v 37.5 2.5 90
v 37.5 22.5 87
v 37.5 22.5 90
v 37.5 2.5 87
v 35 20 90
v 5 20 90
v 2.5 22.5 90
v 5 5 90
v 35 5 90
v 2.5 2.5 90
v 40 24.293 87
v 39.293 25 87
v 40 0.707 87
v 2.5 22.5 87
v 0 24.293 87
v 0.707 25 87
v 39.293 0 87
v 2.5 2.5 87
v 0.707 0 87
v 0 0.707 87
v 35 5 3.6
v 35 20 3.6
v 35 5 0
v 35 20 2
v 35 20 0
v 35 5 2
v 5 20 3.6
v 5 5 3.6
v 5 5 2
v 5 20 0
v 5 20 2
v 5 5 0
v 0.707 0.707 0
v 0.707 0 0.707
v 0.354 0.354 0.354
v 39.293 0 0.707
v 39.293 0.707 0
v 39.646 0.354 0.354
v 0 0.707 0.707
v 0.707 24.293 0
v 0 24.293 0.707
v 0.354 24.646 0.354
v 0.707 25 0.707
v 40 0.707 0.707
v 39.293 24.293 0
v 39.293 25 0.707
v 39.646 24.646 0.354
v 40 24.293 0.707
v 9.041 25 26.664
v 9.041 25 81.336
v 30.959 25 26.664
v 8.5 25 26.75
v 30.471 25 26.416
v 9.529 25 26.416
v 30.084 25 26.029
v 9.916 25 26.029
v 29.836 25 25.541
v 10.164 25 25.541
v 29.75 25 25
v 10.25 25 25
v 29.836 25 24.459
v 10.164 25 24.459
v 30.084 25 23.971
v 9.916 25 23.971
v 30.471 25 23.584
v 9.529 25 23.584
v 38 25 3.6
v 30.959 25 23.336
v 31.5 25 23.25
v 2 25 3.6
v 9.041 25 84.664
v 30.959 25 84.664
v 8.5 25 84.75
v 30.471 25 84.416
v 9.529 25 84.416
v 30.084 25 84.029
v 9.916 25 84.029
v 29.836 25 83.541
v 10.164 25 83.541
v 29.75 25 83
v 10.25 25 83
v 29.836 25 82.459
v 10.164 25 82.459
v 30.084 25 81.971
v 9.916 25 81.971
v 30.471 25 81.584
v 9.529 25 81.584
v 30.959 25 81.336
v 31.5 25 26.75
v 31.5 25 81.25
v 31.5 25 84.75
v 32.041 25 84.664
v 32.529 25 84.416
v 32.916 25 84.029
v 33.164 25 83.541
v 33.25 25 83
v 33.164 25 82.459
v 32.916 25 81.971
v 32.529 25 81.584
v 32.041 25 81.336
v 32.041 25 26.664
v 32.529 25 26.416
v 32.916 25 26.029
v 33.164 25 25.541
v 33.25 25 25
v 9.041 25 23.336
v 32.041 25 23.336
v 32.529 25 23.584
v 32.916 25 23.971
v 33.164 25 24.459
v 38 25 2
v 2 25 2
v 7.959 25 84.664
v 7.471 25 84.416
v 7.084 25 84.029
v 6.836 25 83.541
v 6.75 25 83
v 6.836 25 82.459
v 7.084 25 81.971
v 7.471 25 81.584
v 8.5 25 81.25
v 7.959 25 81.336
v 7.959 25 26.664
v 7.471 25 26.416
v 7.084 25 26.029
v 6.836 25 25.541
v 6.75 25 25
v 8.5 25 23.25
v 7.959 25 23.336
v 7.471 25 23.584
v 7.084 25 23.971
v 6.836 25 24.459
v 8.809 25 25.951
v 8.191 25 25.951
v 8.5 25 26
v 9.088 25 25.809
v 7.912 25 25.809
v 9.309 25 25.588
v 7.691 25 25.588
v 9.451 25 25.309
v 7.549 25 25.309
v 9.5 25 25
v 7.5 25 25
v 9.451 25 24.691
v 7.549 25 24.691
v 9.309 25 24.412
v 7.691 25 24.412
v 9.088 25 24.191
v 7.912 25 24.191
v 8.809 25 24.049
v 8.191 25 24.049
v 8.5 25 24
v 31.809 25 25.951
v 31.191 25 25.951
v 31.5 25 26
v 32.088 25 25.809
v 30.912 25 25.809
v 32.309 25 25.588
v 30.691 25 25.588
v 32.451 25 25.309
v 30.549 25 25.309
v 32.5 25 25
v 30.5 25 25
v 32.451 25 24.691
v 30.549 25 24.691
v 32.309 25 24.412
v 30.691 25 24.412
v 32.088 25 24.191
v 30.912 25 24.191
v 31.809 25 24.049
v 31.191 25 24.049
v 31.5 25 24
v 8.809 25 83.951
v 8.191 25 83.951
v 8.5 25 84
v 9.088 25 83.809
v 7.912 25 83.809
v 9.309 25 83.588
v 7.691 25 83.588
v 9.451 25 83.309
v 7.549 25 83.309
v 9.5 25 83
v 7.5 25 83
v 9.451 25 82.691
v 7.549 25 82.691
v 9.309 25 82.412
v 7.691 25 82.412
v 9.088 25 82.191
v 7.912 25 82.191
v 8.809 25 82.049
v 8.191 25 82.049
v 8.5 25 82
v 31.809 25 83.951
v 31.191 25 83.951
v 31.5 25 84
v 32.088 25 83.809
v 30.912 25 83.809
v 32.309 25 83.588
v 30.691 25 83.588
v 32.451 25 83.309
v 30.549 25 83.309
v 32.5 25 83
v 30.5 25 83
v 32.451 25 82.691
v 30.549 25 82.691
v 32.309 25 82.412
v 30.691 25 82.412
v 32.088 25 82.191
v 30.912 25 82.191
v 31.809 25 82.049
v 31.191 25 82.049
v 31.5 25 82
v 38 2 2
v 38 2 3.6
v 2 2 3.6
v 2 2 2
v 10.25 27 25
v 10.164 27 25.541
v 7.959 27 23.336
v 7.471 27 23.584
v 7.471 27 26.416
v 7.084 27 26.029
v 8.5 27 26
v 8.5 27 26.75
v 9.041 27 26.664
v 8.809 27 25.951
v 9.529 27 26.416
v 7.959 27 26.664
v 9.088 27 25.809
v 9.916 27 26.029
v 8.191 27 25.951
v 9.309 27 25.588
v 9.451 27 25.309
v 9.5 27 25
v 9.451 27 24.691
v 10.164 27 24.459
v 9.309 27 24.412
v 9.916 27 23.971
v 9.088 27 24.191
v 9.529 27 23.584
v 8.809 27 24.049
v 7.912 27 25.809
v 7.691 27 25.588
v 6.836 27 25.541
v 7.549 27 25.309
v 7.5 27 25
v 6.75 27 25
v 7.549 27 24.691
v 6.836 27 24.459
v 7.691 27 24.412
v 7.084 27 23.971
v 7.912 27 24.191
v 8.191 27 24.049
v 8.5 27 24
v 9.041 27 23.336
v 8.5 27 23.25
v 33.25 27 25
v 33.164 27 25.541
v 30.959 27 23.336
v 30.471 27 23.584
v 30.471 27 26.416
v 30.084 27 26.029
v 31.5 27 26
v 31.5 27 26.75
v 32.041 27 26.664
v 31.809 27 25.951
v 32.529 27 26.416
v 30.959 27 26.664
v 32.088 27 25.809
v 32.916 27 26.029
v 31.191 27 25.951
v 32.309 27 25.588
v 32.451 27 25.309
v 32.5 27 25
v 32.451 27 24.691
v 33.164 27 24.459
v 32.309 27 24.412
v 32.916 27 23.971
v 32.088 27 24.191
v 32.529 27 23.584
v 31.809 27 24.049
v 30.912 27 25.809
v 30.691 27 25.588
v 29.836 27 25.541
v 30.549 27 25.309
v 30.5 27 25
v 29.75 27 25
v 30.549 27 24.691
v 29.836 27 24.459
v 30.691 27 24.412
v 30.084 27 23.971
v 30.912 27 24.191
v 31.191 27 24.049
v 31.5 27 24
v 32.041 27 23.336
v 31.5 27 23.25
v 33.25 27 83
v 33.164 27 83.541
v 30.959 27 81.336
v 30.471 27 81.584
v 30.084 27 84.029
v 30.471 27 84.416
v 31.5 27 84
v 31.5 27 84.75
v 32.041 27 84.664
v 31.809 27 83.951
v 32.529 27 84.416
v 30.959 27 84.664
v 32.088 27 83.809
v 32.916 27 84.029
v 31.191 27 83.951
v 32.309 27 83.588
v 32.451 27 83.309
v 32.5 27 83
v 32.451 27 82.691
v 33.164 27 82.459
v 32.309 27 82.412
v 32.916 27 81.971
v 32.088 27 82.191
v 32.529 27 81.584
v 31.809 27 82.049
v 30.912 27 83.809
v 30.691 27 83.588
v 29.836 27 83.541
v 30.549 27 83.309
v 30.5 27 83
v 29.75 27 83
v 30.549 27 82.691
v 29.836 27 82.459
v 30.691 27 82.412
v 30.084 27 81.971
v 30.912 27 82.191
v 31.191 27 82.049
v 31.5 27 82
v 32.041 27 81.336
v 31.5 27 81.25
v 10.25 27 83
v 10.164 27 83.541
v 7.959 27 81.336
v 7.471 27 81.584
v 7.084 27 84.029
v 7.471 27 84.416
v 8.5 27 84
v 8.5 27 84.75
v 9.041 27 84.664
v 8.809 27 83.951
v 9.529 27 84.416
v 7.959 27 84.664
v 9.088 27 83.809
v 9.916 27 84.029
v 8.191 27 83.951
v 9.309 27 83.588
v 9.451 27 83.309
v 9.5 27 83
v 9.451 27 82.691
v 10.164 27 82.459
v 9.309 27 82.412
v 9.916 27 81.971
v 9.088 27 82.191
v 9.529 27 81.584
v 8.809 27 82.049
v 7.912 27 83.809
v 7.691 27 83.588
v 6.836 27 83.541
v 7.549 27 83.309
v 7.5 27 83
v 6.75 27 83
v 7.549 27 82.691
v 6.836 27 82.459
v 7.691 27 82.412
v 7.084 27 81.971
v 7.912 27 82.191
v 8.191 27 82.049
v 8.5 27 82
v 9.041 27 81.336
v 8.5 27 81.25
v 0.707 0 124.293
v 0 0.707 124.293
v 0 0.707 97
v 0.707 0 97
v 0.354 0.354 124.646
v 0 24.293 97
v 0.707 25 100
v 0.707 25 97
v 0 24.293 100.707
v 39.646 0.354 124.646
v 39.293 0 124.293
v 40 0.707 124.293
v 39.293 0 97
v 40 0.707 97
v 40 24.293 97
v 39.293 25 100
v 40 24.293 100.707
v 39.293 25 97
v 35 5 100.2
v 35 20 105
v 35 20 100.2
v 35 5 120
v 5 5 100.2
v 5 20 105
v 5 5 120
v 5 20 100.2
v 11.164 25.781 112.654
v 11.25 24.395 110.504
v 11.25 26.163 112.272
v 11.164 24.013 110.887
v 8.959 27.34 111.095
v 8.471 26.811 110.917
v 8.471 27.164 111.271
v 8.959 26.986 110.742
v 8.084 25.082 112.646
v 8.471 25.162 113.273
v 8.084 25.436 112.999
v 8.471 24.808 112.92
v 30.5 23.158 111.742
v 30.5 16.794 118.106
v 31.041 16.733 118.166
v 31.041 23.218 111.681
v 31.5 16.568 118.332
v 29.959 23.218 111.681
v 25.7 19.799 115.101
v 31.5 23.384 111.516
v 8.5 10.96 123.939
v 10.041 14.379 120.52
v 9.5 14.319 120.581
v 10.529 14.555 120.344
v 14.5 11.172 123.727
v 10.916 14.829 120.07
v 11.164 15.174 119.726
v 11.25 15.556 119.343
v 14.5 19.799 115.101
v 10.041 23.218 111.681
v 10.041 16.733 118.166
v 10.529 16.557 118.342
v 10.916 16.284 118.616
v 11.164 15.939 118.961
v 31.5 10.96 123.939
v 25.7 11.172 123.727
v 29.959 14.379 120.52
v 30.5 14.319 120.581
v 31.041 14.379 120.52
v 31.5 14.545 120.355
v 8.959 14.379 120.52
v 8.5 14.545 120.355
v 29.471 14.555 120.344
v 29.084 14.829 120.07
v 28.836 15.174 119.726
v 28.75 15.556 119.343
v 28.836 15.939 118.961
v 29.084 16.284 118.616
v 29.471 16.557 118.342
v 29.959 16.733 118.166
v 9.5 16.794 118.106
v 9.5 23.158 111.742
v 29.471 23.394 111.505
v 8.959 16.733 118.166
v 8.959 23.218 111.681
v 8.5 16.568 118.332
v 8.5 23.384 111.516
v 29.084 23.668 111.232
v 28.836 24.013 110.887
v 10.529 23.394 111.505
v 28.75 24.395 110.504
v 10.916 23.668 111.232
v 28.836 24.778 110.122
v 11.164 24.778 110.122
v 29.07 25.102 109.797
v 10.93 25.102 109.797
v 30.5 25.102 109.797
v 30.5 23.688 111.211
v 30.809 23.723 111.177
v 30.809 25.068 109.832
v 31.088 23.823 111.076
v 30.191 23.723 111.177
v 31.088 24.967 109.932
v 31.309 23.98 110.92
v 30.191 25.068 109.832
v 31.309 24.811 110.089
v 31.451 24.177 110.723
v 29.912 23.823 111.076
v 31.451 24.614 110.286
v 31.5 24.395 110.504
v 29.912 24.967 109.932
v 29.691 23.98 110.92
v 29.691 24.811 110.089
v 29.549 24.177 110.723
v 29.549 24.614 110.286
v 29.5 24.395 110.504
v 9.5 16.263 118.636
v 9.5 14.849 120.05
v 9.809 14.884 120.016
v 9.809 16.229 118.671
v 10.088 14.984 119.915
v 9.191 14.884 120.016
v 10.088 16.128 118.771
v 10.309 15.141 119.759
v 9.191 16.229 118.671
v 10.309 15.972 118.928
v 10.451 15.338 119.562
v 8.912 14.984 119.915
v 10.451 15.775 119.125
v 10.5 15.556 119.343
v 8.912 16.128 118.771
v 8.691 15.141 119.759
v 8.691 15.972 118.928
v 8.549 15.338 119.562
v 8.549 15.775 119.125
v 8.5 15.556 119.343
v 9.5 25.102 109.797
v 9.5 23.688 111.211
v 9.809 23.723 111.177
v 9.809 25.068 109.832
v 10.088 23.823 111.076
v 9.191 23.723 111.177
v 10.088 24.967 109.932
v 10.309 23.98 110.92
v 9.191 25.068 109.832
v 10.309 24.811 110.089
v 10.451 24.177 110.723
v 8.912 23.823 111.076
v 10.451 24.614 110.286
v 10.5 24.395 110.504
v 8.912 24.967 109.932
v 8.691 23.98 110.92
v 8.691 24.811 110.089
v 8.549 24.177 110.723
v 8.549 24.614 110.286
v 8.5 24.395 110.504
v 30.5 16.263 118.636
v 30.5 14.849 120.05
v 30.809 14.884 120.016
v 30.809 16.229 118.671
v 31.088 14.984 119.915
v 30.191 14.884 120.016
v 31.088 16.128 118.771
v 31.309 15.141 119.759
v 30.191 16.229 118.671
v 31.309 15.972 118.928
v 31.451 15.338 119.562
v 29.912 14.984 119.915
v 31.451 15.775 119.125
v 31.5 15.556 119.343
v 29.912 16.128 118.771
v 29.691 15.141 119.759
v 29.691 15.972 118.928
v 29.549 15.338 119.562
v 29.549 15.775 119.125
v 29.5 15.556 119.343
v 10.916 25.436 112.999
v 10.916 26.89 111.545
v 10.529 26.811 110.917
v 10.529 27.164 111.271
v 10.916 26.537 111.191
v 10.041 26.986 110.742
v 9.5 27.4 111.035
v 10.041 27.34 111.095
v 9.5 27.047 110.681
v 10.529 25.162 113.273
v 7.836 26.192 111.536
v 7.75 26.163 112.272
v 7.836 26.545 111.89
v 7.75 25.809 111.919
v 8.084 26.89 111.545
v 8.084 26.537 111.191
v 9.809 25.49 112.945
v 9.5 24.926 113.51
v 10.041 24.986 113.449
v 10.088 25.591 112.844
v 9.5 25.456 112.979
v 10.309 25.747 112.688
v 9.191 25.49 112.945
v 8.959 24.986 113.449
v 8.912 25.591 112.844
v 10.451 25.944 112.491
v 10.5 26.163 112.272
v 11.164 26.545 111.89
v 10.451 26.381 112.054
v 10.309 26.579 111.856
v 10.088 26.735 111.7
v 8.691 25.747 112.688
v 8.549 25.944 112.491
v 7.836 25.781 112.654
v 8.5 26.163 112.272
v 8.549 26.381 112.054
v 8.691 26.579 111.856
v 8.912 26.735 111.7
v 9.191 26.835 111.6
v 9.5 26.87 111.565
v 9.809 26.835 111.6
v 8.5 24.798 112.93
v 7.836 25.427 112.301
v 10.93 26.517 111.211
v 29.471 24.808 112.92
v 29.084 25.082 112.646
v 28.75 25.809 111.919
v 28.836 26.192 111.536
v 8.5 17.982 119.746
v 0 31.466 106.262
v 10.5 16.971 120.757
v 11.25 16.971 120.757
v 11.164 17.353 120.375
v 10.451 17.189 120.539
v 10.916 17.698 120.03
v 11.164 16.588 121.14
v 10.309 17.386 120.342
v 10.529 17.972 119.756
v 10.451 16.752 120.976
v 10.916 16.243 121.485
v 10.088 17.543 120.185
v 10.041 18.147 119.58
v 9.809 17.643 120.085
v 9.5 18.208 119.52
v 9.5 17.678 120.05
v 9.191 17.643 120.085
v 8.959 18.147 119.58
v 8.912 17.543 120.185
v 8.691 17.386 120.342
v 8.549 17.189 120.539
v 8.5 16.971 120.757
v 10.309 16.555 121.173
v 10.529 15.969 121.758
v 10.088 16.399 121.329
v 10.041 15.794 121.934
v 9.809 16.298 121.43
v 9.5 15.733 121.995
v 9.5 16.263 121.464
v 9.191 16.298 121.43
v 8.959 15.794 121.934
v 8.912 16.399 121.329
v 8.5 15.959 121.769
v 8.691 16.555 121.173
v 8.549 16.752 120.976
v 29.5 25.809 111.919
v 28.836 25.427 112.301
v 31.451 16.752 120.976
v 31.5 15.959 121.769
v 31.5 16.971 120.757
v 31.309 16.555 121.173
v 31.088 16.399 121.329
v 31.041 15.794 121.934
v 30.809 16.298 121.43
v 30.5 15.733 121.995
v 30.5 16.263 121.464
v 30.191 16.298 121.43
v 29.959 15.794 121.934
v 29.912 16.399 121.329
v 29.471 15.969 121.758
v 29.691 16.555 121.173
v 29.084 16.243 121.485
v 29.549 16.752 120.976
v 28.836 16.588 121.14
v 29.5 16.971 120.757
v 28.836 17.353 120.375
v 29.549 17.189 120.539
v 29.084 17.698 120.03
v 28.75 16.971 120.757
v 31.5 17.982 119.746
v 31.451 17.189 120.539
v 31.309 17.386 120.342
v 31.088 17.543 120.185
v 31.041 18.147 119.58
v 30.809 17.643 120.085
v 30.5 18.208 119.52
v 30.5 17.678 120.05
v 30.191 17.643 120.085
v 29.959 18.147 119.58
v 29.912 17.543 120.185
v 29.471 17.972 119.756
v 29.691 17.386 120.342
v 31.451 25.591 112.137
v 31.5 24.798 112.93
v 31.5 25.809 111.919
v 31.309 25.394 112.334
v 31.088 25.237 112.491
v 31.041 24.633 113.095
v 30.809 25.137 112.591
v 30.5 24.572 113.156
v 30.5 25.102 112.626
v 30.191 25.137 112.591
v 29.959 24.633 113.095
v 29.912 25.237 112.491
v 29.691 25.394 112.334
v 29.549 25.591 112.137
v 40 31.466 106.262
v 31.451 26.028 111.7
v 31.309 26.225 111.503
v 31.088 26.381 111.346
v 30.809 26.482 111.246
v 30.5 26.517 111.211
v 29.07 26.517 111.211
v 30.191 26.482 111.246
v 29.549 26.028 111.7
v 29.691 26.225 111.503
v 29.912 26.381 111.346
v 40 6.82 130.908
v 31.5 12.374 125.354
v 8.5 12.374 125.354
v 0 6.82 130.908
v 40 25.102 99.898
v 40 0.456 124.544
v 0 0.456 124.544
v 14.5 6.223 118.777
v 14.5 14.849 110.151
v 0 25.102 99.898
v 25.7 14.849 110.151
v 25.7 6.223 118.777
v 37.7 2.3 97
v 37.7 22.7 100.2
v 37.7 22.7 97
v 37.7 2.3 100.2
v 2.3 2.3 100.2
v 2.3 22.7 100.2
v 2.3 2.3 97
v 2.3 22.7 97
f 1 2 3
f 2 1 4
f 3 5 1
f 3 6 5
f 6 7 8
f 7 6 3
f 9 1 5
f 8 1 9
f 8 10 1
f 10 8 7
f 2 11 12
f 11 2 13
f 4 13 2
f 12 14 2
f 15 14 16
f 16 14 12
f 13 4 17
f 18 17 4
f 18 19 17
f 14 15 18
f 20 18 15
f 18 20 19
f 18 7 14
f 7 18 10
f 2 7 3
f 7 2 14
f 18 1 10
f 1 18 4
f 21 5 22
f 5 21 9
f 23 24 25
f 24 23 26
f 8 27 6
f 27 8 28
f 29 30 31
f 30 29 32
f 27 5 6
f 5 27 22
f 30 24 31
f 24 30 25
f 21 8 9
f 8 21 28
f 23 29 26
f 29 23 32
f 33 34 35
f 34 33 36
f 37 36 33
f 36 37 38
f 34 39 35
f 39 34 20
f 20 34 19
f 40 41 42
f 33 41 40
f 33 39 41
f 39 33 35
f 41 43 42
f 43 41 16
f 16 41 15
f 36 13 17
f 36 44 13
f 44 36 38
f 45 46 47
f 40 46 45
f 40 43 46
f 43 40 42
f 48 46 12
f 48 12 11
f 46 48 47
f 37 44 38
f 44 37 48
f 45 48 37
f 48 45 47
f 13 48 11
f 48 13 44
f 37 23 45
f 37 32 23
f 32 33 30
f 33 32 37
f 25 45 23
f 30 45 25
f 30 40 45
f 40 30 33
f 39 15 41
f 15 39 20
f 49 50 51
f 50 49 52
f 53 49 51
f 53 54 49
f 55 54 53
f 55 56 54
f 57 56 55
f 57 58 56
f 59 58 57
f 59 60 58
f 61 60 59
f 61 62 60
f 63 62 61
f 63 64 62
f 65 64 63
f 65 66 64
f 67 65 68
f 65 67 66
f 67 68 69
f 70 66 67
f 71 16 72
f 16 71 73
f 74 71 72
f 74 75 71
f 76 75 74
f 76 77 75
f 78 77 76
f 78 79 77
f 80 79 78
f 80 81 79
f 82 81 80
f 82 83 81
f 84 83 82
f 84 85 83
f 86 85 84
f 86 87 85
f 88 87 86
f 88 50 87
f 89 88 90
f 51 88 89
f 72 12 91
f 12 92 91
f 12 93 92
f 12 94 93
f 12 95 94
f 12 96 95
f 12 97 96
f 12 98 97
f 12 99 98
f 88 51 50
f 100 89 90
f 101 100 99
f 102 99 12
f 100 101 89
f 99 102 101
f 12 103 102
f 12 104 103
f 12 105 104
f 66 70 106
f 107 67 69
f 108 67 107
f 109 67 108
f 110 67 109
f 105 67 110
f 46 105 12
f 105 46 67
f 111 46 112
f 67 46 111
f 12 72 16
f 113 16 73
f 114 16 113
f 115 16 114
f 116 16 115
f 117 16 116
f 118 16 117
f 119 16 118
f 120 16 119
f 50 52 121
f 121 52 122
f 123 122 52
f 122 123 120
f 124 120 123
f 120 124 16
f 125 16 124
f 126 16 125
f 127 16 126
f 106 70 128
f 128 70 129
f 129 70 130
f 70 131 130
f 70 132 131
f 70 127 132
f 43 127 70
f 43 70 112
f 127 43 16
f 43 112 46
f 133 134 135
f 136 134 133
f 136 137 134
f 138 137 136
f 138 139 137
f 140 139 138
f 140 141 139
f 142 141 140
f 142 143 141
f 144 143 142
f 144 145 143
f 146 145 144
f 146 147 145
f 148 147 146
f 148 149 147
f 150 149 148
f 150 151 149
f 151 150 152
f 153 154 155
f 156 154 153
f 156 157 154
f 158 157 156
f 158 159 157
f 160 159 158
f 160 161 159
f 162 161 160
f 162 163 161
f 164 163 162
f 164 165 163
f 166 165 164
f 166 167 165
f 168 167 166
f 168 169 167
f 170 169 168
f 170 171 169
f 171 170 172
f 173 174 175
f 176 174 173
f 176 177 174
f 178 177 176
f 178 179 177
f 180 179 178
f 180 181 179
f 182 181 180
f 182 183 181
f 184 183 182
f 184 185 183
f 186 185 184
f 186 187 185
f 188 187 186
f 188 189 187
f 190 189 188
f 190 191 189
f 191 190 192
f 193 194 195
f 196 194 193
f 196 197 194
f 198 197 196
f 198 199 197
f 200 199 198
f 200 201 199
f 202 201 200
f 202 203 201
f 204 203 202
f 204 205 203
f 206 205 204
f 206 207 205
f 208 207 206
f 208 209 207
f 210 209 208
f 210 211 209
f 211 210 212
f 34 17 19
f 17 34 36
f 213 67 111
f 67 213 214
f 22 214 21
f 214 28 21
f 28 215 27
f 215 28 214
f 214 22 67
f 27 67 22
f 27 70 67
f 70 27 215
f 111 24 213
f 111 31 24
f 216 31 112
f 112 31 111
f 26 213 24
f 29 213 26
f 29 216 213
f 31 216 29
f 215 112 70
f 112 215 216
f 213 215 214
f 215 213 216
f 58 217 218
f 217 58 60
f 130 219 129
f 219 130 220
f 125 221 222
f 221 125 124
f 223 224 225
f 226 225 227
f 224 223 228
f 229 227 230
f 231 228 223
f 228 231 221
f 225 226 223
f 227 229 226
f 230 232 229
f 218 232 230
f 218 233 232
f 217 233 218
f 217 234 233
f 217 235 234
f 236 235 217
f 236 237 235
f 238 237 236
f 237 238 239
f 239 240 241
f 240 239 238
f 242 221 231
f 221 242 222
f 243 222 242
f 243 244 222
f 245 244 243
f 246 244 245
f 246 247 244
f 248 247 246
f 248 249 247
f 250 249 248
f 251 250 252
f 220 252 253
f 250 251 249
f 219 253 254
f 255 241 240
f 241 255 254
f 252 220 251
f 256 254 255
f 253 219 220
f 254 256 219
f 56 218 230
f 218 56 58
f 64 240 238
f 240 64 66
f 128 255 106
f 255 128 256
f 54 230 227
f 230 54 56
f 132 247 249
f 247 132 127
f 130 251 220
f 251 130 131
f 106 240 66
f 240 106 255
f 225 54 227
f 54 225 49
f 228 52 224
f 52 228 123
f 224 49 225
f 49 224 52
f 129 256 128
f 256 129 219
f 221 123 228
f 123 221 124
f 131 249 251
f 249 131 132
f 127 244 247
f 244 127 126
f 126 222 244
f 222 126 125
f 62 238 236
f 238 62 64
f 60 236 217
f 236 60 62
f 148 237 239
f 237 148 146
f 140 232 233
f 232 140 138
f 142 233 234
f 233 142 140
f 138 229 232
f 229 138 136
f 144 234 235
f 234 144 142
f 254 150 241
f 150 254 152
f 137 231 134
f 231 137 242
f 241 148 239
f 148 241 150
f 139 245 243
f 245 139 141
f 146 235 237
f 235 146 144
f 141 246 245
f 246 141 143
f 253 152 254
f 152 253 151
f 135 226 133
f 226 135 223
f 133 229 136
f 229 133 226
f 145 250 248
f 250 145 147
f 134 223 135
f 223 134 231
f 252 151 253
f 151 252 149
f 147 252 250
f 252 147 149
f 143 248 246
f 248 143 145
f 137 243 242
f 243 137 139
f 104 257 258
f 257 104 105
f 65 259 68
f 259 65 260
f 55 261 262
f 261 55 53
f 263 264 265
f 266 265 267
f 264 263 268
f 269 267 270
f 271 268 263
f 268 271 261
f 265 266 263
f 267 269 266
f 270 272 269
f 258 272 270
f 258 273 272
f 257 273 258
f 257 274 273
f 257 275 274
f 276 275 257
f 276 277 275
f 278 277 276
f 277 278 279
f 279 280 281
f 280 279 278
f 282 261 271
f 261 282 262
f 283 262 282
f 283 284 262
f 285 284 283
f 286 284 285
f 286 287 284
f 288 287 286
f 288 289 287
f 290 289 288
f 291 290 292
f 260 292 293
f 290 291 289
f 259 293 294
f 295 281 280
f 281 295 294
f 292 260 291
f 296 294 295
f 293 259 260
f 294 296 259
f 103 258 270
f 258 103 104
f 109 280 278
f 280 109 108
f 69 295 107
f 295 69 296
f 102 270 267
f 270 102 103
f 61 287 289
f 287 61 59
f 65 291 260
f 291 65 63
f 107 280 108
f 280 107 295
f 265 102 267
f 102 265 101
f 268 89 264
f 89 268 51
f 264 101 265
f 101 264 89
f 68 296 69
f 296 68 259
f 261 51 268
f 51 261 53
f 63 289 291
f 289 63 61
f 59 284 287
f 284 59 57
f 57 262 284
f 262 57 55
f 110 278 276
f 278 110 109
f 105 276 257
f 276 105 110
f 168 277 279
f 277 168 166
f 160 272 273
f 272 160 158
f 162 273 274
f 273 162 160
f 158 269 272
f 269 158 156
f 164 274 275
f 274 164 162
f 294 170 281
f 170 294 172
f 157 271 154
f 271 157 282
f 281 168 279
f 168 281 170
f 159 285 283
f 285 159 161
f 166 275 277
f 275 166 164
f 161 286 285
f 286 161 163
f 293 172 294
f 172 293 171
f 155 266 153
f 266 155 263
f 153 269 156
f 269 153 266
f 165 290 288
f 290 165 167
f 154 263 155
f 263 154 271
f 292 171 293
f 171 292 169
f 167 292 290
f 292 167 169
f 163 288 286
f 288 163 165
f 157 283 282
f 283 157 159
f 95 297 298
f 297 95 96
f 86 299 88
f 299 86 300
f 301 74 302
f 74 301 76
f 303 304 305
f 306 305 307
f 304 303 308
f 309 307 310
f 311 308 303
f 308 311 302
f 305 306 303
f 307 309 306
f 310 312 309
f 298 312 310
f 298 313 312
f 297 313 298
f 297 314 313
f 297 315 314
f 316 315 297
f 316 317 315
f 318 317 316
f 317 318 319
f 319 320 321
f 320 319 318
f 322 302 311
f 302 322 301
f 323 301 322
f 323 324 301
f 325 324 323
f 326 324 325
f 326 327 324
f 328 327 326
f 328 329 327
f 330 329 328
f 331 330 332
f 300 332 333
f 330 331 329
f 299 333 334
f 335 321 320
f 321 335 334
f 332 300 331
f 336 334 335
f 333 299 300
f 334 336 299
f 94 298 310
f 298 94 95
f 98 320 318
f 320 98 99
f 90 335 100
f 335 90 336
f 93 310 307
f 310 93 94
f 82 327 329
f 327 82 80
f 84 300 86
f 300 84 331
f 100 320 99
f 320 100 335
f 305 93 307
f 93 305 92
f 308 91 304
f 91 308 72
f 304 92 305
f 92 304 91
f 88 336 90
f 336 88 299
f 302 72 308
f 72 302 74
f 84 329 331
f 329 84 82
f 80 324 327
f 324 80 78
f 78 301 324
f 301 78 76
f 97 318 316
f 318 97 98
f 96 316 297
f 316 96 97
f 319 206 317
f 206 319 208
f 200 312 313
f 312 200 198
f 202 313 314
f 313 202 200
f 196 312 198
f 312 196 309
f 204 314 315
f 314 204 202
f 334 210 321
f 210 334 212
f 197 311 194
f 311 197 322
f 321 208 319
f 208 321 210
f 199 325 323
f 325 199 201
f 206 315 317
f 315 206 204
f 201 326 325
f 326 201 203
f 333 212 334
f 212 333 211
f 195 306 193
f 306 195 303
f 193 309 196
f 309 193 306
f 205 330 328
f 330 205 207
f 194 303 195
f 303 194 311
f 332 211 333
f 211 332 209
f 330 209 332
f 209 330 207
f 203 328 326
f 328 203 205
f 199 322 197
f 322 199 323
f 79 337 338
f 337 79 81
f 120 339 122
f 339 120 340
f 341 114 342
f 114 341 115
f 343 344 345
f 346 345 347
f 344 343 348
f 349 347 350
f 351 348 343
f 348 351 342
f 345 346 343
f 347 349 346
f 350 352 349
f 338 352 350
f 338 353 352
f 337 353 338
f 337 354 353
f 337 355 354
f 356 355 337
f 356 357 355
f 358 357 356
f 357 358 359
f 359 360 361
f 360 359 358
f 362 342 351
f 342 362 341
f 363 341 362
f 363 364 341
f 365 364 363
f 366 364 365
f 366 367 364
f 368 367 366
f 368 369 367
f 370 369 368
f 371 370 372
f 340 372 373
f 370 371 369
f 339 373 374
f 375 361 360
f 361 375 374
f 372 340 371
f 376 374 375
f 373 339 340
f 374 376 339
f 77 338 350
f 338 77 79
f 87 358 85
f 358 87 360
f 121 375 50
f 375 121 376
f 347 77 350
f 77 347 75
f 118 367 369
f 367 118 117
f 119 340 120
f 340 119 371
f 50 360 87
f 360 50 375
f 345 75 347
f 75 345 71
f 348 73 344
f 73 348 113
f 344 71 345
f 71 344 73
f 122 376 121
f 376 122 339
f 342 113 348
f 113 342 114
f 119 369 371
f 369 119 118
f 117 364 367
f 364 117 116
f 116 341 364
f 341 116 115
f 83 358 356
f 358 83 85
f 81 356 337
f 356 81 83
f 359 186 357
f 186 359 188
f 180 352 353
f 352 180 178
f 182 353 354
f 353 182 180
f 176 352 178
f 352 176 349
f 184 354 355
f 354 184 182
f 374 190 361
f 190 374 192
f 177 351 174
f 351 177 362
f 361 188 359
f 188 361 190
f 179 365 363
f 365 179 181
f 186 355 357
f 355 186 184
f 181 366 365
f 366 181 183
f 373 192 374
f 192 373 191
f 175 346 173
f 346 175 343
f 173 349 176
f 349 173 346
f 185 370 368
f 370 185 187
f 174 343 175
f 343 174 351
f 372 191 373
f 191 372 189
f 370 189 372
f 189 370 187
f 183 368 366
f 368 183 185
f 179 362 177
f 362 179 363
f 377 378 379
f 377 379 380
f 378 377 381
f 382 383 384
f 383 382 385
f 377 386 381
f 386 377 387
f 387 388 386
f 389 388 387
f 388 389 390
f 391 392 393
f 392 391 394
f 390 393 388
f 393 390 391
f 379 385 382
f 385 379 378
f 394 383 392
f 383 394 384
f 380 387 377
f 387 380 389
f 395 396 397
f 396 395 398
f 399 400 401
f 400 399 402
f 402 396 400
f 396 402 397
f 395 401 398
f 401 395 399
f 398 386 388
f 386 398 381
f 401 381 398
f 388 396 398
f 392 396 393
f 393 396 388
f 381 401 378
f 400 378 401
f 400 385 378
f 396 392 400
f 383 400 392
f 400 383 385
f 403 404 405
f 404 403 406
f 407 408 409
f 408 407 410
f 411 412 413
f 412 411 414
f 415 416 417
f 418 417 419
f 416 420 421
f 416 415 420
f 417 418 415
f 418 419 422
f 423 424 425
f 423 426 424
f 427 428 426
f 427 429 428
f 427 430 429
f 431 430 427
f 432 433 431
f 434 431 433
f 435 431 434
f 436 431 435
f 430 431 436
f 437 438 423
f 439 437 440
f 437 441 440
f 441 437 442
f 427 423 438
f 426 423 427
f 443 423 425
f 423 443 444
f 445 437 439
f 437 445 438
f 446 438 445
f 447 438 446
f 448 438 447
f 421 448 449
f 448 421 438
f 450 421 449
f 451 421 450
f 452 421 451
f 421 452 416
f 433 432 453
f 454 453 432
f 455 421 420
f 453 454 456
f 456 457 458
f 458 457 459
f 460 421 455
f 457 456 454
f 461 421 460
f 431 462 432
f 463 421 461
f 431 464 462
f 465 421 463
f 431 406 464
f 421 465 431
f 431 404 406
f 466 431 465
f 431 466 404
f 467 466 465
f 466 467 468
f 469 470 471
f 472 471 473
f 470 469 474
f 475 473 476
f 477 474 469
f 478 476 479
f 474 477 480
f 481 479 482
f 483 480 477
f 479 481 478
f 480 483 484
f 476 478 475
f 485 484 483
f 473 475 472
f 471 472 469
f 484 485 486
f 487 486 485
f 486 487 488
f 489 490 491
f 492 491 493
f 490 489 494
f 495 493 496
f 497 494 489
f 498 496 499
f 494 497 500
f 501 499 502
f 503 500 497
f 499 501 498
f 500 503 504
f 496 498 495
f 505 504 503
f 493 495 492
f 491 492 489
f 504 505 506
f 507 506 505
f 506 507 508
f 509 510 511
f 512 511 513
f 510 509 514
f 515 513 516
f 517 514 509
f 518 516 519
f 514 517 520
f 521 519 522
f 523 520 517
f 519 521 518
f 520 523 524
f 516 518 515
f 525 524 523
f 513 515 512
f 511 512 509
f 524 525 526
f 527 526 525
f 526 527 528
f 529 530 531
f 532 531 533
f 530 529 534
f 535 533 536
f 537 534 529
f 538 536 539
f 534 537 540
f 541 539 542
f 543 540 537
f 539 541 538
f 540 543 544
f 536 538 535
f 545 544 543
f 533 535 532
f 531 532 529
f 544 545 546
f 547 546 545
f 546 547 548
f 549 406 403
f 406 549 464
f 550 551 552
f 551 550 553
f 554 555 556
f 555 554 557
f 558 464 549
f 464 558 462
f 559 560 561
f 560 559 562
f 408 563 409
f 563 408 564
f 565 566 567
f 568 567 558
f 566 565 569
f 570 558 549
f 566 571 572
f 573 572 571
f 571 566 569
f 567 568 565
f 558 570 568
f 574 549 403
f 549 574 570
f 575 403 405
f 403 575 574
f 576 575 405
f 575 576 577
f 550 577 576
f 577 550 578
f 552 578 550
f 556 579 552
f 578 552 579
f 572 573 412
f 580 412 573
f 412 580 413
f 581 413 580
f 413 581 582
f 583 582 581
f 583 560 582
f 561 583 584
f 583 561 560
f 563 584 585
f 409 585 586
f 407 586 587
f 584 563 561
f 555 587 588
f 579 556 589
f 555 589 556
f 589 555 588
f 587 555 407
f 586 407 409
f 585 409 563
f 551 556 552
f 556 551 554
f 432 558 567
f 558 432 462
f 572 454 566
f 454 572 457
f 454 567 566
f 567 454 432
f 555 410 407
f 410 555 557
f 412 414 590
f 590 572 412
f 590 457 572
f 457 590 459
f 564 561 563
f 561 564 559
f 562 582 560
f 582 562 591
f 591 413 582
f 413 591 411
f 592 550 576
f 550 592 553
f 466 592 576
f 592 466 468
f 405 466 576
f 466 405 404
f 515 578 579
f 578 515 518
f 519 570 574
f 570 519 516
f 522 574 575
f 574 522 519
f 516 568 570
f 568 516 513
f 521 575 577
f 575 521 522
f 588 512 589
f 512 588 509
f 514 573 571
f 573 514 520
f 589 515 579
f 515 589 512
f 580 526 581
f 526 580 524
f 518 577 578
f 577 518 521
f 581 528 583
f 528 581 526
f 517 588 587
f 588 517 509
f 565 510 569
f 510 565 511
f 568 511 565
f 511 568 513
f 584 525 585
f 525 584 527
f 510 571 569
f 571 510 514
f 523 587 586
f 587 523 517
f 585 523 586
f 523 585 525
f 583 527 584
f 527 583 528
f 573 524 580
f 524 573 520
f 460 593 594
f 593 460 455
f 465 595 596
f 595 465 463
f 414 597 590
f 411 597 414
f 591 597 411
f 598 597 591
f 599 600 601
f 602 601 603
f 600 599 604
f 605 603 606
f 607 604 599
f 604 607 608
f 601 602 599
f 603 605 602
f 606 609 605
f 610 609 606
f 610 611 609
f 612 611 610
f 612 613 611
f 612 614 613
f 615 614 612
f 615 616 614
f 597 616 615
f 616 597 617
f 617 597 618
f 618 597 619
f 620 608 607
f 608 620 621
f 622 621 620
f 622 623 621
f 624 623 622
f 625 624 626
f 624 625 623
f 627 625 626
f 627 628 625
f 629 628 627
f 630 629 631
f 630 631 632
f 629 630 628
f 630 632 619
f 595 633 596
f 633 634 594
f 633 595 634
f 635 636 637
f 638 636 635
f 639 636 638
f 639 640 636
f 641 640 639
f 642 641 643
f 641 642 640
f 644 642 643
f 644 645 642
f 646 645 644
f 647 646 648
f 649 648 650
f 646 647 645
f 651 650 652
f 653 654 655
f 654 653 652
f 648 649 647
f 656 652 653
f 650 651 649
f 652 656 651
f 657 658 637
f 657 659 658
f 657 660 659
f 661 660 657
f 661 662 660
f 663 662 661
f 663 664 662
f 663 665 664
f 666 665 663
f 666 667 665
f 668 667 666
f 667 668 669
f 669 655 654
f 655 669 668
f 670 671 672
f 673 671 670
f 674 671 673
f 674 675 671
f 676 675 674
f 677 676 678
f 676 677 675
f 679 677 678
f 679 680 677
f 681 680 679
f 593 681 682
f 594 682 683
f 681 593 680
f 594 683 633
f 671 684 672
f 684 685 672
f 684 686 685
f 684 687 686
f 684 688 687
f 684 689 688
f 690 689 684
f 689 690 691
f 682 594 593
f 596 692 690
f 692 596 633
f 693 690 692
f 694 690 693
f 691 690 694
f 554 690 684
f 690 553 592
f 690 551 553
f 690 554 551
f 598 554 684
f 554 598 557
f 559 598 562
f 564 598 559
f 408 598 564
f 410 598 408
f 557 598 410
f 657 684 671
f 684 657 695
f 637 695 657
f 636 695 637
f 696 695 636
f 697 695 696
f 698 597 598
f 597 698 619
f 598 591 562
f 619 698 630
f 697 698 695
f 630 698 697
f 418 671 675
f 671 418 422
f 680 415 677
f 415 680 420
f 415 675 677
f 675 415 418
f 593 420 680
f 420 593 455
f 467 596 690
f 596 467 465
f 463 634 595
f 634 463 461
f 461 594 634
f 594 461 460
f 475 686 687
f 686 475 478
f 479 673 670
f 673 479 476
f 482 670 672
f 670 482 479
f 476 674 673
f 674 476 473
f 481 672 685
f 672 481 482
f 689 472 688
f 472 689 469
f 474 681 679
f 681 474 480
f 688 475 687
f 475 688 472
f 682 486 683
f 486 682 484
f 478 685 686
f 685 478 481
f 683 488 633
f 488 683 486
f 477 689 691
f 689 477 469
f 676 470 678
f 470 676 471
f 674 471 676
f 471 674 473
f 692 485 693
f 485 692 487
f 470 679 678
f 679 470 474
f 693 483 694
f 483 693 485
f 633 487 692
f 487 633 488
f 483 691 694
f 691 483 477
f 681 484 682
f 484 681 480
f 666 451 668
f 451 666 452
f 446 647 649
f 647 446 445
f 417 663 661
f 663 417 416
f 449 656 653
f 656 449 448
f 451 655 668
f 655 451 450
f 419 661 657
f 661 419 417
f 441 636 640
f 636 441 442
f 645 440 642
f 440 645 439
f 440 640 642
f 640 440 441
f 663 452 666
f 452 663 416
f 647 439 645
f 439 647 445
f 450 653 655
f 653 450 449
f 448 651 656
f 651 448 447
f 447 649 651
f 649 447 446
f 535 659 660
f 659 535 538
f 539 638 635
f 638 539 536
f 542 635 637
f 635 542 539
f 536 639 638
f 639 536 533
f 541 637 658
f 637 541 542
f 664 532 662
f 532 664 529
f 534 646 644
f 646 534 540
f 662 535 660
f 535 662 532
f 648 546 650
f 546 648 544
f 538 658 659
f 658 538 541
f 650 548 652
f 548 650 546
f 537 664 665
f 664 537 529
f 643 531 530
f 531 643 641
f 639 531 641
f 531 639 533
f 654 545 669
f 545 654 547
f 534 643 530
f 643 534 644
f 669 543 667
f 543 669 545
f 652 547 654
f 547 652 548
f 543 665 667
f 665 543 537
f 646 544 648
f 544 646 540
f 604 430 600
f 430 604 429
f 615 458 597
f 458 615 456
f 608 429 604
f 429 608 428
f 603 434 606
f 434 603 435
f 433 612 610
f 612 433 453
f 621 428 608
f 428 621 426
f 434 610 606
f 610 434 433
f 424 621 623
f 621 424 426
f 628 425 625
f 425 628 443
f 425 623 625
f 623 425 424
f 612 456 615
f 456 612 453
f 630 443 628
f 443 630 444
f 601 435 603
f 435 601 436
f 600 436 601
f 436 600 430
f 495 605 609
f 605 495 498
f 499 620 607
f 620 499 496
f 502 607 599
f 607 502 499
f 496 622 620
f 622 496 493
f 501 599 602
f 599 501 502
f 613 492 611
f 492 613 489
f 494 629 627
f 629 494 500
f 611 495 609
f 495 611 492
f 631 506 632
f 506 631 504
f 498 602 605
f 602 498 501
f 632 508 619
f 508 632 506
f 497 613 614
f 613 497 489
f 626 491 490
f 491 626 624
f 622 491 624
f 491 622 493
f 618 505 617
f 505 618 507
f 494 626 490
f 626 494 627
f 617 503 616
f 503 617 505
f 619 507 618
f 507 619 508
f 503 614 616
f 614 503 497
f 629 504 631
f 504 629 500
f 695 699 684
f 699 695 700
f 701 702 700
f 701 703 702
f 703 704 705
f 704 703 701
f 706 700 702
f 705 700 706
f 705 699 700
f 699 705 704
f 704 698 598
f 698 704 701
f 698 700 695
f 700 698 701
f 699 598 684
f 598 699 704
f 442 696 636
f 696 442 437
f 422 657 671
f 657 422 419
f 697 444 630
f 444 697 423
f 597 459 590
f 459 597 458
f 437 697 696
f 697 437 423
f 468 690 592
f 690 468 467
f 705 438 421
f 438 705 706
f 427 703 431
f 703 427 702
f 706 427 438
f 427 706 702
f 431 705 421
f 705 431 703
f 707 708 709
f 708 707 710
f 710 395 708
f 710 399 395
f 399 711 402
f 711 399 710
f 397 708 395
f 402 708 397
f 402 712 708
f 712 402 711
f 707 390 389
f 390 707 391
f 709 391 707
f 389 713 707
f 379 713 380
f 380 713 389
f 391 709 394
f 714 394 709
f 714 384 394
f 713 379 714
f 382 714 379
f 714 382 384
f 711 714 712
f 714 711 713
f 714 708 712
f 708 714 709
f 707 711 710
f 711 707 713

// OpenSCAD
// file: chamfer.scad
module chamfered_cube(size, chamfer, center = false) {
    center_offset = center ? [
        -size[0]/2,
        -size[1]/2,
        -size[2]/2
    ] : [0,0,0];
    
    translate(center_offset)
    
    difference() {
        cube(size);
        
        chamfer_cross(size, chamfer);
        
        translate([0,size[1],size[2]])
        chamfer_cross(size, chamfer);
        
        translate([size[0],0,size[2]])
        chamfer_cross(size, chamfer);
        
        translate([size[0],size[1], 0])
        chamfer_cross(size, chamfer);
    }
}

module chamfer_cross(size, chamfer){
    for(z=[0:3]) for(y=[0:3])
            rotate([0,90*y,90*z])
            translate([max(size)/2,0,0])
            rotate([45,0,0])
            cube([max(size),chamfer,chamfer], true);
}

chamfered_cube([10,20,30], 2, true);
// main file
use <chamfer.scad>;

camera_angle = 45;

diffraction_angle = 45;
tall = 115;
wall = 5;
width = 30;
height = 15;



difference(){
    translate([wall/2, wall/2, 87]) cube([width+wall, height+wall, 3]);
    translate([wall, wall, 87]) cube([width, height, 3]);
}


intersection(){
    pi_spec();
    cube([100, 100, 87]);
}

translate([0,0,10])
difference(){
    pi_spec();
    cube([100, 100, 87]);
    
    difference(){
        translate([wall/2-0.2, wall/2-0.2, 87]) cube([width+wall+0.4, height+wall+0.4, 3+0.2]);
        translate([wall, wall, 87]) cube([width, height, 3]);
    }
}

module pi_spec(){
    spec();
    
    translate([9.5,0,tall])
    rotate([-45,0,0])
    translate([0,27.5,7])
    mirror([0,1,0])
    pi_camera_standoffs();

    rotate([90,0,0])
    translate([wall+(width-23)/2,25,-height-wall*2-2])
    pi_zero_standoffs();
}



module dvd() {
    difference() {
        cylinder(1, 120/2+0.3, 120/2+0.3, $fn=100);
        cylinder(2, 15/2-0.3, 15/2-0.3, $fn=40);
        
    }
}

module grating_holder() {
    
    difference(){
        translate([-width/2-wall,0,-1])
        cube([width+wall*2, 65, 2]);
        
        translate([0,3,0])
        #dvd();
    }
}




module m2_stand(height=2.5){
    $fn=20;
    difference(){
        cylinder(height, 3.5/2, 3.5/2);
        cylinder(height+1, 2/2, 2/2);
    }    
}

module pi_camera_standoffs(){
        m2_stand();
        translate([21,0,0]) m2_stand(2);
        translate([21,12.5,0]) m2_stand(2);
        translate([0,12.5,0]) m2_stand(2);
    
    difference(){
        translate([-width+23-wall/2,-8,-7]) cube([width+wall*2,(height+wall*2)/sin(45)-0.5,9]);
        #translate([-1,-1,0]) cube([23,20,9]);
        translate([5,6.5,-20]) cube([11.2, 12.2, 30]);
    }
    
    #
    difference(){
        
        
    }
}

module pi_zero_standoffs(){
        m2_stand();
        translate([23,0,0]) m2_stand();
        translate([23,65-7,0]) m2_stand();
        translate([0,65-7,0]) m2_stand();    
}

module spec(){
    difference(){
        
        chamfered_cube([width+wall*2, height+wall*2, tall], 1);

        
        translate([wall, wall, -1])
        cube([width, height, tall+10]);
        
        translate([0,0,tall])
        rotate([-diffraction_angle,0,0])
        cube([100, 100, 100]);
        
        
        
        #translate([wall/2-0.5, wall/2-0.5, 2])
        cube([width+wall+1, 60+1, 1+0.6]);
        
    }
}
